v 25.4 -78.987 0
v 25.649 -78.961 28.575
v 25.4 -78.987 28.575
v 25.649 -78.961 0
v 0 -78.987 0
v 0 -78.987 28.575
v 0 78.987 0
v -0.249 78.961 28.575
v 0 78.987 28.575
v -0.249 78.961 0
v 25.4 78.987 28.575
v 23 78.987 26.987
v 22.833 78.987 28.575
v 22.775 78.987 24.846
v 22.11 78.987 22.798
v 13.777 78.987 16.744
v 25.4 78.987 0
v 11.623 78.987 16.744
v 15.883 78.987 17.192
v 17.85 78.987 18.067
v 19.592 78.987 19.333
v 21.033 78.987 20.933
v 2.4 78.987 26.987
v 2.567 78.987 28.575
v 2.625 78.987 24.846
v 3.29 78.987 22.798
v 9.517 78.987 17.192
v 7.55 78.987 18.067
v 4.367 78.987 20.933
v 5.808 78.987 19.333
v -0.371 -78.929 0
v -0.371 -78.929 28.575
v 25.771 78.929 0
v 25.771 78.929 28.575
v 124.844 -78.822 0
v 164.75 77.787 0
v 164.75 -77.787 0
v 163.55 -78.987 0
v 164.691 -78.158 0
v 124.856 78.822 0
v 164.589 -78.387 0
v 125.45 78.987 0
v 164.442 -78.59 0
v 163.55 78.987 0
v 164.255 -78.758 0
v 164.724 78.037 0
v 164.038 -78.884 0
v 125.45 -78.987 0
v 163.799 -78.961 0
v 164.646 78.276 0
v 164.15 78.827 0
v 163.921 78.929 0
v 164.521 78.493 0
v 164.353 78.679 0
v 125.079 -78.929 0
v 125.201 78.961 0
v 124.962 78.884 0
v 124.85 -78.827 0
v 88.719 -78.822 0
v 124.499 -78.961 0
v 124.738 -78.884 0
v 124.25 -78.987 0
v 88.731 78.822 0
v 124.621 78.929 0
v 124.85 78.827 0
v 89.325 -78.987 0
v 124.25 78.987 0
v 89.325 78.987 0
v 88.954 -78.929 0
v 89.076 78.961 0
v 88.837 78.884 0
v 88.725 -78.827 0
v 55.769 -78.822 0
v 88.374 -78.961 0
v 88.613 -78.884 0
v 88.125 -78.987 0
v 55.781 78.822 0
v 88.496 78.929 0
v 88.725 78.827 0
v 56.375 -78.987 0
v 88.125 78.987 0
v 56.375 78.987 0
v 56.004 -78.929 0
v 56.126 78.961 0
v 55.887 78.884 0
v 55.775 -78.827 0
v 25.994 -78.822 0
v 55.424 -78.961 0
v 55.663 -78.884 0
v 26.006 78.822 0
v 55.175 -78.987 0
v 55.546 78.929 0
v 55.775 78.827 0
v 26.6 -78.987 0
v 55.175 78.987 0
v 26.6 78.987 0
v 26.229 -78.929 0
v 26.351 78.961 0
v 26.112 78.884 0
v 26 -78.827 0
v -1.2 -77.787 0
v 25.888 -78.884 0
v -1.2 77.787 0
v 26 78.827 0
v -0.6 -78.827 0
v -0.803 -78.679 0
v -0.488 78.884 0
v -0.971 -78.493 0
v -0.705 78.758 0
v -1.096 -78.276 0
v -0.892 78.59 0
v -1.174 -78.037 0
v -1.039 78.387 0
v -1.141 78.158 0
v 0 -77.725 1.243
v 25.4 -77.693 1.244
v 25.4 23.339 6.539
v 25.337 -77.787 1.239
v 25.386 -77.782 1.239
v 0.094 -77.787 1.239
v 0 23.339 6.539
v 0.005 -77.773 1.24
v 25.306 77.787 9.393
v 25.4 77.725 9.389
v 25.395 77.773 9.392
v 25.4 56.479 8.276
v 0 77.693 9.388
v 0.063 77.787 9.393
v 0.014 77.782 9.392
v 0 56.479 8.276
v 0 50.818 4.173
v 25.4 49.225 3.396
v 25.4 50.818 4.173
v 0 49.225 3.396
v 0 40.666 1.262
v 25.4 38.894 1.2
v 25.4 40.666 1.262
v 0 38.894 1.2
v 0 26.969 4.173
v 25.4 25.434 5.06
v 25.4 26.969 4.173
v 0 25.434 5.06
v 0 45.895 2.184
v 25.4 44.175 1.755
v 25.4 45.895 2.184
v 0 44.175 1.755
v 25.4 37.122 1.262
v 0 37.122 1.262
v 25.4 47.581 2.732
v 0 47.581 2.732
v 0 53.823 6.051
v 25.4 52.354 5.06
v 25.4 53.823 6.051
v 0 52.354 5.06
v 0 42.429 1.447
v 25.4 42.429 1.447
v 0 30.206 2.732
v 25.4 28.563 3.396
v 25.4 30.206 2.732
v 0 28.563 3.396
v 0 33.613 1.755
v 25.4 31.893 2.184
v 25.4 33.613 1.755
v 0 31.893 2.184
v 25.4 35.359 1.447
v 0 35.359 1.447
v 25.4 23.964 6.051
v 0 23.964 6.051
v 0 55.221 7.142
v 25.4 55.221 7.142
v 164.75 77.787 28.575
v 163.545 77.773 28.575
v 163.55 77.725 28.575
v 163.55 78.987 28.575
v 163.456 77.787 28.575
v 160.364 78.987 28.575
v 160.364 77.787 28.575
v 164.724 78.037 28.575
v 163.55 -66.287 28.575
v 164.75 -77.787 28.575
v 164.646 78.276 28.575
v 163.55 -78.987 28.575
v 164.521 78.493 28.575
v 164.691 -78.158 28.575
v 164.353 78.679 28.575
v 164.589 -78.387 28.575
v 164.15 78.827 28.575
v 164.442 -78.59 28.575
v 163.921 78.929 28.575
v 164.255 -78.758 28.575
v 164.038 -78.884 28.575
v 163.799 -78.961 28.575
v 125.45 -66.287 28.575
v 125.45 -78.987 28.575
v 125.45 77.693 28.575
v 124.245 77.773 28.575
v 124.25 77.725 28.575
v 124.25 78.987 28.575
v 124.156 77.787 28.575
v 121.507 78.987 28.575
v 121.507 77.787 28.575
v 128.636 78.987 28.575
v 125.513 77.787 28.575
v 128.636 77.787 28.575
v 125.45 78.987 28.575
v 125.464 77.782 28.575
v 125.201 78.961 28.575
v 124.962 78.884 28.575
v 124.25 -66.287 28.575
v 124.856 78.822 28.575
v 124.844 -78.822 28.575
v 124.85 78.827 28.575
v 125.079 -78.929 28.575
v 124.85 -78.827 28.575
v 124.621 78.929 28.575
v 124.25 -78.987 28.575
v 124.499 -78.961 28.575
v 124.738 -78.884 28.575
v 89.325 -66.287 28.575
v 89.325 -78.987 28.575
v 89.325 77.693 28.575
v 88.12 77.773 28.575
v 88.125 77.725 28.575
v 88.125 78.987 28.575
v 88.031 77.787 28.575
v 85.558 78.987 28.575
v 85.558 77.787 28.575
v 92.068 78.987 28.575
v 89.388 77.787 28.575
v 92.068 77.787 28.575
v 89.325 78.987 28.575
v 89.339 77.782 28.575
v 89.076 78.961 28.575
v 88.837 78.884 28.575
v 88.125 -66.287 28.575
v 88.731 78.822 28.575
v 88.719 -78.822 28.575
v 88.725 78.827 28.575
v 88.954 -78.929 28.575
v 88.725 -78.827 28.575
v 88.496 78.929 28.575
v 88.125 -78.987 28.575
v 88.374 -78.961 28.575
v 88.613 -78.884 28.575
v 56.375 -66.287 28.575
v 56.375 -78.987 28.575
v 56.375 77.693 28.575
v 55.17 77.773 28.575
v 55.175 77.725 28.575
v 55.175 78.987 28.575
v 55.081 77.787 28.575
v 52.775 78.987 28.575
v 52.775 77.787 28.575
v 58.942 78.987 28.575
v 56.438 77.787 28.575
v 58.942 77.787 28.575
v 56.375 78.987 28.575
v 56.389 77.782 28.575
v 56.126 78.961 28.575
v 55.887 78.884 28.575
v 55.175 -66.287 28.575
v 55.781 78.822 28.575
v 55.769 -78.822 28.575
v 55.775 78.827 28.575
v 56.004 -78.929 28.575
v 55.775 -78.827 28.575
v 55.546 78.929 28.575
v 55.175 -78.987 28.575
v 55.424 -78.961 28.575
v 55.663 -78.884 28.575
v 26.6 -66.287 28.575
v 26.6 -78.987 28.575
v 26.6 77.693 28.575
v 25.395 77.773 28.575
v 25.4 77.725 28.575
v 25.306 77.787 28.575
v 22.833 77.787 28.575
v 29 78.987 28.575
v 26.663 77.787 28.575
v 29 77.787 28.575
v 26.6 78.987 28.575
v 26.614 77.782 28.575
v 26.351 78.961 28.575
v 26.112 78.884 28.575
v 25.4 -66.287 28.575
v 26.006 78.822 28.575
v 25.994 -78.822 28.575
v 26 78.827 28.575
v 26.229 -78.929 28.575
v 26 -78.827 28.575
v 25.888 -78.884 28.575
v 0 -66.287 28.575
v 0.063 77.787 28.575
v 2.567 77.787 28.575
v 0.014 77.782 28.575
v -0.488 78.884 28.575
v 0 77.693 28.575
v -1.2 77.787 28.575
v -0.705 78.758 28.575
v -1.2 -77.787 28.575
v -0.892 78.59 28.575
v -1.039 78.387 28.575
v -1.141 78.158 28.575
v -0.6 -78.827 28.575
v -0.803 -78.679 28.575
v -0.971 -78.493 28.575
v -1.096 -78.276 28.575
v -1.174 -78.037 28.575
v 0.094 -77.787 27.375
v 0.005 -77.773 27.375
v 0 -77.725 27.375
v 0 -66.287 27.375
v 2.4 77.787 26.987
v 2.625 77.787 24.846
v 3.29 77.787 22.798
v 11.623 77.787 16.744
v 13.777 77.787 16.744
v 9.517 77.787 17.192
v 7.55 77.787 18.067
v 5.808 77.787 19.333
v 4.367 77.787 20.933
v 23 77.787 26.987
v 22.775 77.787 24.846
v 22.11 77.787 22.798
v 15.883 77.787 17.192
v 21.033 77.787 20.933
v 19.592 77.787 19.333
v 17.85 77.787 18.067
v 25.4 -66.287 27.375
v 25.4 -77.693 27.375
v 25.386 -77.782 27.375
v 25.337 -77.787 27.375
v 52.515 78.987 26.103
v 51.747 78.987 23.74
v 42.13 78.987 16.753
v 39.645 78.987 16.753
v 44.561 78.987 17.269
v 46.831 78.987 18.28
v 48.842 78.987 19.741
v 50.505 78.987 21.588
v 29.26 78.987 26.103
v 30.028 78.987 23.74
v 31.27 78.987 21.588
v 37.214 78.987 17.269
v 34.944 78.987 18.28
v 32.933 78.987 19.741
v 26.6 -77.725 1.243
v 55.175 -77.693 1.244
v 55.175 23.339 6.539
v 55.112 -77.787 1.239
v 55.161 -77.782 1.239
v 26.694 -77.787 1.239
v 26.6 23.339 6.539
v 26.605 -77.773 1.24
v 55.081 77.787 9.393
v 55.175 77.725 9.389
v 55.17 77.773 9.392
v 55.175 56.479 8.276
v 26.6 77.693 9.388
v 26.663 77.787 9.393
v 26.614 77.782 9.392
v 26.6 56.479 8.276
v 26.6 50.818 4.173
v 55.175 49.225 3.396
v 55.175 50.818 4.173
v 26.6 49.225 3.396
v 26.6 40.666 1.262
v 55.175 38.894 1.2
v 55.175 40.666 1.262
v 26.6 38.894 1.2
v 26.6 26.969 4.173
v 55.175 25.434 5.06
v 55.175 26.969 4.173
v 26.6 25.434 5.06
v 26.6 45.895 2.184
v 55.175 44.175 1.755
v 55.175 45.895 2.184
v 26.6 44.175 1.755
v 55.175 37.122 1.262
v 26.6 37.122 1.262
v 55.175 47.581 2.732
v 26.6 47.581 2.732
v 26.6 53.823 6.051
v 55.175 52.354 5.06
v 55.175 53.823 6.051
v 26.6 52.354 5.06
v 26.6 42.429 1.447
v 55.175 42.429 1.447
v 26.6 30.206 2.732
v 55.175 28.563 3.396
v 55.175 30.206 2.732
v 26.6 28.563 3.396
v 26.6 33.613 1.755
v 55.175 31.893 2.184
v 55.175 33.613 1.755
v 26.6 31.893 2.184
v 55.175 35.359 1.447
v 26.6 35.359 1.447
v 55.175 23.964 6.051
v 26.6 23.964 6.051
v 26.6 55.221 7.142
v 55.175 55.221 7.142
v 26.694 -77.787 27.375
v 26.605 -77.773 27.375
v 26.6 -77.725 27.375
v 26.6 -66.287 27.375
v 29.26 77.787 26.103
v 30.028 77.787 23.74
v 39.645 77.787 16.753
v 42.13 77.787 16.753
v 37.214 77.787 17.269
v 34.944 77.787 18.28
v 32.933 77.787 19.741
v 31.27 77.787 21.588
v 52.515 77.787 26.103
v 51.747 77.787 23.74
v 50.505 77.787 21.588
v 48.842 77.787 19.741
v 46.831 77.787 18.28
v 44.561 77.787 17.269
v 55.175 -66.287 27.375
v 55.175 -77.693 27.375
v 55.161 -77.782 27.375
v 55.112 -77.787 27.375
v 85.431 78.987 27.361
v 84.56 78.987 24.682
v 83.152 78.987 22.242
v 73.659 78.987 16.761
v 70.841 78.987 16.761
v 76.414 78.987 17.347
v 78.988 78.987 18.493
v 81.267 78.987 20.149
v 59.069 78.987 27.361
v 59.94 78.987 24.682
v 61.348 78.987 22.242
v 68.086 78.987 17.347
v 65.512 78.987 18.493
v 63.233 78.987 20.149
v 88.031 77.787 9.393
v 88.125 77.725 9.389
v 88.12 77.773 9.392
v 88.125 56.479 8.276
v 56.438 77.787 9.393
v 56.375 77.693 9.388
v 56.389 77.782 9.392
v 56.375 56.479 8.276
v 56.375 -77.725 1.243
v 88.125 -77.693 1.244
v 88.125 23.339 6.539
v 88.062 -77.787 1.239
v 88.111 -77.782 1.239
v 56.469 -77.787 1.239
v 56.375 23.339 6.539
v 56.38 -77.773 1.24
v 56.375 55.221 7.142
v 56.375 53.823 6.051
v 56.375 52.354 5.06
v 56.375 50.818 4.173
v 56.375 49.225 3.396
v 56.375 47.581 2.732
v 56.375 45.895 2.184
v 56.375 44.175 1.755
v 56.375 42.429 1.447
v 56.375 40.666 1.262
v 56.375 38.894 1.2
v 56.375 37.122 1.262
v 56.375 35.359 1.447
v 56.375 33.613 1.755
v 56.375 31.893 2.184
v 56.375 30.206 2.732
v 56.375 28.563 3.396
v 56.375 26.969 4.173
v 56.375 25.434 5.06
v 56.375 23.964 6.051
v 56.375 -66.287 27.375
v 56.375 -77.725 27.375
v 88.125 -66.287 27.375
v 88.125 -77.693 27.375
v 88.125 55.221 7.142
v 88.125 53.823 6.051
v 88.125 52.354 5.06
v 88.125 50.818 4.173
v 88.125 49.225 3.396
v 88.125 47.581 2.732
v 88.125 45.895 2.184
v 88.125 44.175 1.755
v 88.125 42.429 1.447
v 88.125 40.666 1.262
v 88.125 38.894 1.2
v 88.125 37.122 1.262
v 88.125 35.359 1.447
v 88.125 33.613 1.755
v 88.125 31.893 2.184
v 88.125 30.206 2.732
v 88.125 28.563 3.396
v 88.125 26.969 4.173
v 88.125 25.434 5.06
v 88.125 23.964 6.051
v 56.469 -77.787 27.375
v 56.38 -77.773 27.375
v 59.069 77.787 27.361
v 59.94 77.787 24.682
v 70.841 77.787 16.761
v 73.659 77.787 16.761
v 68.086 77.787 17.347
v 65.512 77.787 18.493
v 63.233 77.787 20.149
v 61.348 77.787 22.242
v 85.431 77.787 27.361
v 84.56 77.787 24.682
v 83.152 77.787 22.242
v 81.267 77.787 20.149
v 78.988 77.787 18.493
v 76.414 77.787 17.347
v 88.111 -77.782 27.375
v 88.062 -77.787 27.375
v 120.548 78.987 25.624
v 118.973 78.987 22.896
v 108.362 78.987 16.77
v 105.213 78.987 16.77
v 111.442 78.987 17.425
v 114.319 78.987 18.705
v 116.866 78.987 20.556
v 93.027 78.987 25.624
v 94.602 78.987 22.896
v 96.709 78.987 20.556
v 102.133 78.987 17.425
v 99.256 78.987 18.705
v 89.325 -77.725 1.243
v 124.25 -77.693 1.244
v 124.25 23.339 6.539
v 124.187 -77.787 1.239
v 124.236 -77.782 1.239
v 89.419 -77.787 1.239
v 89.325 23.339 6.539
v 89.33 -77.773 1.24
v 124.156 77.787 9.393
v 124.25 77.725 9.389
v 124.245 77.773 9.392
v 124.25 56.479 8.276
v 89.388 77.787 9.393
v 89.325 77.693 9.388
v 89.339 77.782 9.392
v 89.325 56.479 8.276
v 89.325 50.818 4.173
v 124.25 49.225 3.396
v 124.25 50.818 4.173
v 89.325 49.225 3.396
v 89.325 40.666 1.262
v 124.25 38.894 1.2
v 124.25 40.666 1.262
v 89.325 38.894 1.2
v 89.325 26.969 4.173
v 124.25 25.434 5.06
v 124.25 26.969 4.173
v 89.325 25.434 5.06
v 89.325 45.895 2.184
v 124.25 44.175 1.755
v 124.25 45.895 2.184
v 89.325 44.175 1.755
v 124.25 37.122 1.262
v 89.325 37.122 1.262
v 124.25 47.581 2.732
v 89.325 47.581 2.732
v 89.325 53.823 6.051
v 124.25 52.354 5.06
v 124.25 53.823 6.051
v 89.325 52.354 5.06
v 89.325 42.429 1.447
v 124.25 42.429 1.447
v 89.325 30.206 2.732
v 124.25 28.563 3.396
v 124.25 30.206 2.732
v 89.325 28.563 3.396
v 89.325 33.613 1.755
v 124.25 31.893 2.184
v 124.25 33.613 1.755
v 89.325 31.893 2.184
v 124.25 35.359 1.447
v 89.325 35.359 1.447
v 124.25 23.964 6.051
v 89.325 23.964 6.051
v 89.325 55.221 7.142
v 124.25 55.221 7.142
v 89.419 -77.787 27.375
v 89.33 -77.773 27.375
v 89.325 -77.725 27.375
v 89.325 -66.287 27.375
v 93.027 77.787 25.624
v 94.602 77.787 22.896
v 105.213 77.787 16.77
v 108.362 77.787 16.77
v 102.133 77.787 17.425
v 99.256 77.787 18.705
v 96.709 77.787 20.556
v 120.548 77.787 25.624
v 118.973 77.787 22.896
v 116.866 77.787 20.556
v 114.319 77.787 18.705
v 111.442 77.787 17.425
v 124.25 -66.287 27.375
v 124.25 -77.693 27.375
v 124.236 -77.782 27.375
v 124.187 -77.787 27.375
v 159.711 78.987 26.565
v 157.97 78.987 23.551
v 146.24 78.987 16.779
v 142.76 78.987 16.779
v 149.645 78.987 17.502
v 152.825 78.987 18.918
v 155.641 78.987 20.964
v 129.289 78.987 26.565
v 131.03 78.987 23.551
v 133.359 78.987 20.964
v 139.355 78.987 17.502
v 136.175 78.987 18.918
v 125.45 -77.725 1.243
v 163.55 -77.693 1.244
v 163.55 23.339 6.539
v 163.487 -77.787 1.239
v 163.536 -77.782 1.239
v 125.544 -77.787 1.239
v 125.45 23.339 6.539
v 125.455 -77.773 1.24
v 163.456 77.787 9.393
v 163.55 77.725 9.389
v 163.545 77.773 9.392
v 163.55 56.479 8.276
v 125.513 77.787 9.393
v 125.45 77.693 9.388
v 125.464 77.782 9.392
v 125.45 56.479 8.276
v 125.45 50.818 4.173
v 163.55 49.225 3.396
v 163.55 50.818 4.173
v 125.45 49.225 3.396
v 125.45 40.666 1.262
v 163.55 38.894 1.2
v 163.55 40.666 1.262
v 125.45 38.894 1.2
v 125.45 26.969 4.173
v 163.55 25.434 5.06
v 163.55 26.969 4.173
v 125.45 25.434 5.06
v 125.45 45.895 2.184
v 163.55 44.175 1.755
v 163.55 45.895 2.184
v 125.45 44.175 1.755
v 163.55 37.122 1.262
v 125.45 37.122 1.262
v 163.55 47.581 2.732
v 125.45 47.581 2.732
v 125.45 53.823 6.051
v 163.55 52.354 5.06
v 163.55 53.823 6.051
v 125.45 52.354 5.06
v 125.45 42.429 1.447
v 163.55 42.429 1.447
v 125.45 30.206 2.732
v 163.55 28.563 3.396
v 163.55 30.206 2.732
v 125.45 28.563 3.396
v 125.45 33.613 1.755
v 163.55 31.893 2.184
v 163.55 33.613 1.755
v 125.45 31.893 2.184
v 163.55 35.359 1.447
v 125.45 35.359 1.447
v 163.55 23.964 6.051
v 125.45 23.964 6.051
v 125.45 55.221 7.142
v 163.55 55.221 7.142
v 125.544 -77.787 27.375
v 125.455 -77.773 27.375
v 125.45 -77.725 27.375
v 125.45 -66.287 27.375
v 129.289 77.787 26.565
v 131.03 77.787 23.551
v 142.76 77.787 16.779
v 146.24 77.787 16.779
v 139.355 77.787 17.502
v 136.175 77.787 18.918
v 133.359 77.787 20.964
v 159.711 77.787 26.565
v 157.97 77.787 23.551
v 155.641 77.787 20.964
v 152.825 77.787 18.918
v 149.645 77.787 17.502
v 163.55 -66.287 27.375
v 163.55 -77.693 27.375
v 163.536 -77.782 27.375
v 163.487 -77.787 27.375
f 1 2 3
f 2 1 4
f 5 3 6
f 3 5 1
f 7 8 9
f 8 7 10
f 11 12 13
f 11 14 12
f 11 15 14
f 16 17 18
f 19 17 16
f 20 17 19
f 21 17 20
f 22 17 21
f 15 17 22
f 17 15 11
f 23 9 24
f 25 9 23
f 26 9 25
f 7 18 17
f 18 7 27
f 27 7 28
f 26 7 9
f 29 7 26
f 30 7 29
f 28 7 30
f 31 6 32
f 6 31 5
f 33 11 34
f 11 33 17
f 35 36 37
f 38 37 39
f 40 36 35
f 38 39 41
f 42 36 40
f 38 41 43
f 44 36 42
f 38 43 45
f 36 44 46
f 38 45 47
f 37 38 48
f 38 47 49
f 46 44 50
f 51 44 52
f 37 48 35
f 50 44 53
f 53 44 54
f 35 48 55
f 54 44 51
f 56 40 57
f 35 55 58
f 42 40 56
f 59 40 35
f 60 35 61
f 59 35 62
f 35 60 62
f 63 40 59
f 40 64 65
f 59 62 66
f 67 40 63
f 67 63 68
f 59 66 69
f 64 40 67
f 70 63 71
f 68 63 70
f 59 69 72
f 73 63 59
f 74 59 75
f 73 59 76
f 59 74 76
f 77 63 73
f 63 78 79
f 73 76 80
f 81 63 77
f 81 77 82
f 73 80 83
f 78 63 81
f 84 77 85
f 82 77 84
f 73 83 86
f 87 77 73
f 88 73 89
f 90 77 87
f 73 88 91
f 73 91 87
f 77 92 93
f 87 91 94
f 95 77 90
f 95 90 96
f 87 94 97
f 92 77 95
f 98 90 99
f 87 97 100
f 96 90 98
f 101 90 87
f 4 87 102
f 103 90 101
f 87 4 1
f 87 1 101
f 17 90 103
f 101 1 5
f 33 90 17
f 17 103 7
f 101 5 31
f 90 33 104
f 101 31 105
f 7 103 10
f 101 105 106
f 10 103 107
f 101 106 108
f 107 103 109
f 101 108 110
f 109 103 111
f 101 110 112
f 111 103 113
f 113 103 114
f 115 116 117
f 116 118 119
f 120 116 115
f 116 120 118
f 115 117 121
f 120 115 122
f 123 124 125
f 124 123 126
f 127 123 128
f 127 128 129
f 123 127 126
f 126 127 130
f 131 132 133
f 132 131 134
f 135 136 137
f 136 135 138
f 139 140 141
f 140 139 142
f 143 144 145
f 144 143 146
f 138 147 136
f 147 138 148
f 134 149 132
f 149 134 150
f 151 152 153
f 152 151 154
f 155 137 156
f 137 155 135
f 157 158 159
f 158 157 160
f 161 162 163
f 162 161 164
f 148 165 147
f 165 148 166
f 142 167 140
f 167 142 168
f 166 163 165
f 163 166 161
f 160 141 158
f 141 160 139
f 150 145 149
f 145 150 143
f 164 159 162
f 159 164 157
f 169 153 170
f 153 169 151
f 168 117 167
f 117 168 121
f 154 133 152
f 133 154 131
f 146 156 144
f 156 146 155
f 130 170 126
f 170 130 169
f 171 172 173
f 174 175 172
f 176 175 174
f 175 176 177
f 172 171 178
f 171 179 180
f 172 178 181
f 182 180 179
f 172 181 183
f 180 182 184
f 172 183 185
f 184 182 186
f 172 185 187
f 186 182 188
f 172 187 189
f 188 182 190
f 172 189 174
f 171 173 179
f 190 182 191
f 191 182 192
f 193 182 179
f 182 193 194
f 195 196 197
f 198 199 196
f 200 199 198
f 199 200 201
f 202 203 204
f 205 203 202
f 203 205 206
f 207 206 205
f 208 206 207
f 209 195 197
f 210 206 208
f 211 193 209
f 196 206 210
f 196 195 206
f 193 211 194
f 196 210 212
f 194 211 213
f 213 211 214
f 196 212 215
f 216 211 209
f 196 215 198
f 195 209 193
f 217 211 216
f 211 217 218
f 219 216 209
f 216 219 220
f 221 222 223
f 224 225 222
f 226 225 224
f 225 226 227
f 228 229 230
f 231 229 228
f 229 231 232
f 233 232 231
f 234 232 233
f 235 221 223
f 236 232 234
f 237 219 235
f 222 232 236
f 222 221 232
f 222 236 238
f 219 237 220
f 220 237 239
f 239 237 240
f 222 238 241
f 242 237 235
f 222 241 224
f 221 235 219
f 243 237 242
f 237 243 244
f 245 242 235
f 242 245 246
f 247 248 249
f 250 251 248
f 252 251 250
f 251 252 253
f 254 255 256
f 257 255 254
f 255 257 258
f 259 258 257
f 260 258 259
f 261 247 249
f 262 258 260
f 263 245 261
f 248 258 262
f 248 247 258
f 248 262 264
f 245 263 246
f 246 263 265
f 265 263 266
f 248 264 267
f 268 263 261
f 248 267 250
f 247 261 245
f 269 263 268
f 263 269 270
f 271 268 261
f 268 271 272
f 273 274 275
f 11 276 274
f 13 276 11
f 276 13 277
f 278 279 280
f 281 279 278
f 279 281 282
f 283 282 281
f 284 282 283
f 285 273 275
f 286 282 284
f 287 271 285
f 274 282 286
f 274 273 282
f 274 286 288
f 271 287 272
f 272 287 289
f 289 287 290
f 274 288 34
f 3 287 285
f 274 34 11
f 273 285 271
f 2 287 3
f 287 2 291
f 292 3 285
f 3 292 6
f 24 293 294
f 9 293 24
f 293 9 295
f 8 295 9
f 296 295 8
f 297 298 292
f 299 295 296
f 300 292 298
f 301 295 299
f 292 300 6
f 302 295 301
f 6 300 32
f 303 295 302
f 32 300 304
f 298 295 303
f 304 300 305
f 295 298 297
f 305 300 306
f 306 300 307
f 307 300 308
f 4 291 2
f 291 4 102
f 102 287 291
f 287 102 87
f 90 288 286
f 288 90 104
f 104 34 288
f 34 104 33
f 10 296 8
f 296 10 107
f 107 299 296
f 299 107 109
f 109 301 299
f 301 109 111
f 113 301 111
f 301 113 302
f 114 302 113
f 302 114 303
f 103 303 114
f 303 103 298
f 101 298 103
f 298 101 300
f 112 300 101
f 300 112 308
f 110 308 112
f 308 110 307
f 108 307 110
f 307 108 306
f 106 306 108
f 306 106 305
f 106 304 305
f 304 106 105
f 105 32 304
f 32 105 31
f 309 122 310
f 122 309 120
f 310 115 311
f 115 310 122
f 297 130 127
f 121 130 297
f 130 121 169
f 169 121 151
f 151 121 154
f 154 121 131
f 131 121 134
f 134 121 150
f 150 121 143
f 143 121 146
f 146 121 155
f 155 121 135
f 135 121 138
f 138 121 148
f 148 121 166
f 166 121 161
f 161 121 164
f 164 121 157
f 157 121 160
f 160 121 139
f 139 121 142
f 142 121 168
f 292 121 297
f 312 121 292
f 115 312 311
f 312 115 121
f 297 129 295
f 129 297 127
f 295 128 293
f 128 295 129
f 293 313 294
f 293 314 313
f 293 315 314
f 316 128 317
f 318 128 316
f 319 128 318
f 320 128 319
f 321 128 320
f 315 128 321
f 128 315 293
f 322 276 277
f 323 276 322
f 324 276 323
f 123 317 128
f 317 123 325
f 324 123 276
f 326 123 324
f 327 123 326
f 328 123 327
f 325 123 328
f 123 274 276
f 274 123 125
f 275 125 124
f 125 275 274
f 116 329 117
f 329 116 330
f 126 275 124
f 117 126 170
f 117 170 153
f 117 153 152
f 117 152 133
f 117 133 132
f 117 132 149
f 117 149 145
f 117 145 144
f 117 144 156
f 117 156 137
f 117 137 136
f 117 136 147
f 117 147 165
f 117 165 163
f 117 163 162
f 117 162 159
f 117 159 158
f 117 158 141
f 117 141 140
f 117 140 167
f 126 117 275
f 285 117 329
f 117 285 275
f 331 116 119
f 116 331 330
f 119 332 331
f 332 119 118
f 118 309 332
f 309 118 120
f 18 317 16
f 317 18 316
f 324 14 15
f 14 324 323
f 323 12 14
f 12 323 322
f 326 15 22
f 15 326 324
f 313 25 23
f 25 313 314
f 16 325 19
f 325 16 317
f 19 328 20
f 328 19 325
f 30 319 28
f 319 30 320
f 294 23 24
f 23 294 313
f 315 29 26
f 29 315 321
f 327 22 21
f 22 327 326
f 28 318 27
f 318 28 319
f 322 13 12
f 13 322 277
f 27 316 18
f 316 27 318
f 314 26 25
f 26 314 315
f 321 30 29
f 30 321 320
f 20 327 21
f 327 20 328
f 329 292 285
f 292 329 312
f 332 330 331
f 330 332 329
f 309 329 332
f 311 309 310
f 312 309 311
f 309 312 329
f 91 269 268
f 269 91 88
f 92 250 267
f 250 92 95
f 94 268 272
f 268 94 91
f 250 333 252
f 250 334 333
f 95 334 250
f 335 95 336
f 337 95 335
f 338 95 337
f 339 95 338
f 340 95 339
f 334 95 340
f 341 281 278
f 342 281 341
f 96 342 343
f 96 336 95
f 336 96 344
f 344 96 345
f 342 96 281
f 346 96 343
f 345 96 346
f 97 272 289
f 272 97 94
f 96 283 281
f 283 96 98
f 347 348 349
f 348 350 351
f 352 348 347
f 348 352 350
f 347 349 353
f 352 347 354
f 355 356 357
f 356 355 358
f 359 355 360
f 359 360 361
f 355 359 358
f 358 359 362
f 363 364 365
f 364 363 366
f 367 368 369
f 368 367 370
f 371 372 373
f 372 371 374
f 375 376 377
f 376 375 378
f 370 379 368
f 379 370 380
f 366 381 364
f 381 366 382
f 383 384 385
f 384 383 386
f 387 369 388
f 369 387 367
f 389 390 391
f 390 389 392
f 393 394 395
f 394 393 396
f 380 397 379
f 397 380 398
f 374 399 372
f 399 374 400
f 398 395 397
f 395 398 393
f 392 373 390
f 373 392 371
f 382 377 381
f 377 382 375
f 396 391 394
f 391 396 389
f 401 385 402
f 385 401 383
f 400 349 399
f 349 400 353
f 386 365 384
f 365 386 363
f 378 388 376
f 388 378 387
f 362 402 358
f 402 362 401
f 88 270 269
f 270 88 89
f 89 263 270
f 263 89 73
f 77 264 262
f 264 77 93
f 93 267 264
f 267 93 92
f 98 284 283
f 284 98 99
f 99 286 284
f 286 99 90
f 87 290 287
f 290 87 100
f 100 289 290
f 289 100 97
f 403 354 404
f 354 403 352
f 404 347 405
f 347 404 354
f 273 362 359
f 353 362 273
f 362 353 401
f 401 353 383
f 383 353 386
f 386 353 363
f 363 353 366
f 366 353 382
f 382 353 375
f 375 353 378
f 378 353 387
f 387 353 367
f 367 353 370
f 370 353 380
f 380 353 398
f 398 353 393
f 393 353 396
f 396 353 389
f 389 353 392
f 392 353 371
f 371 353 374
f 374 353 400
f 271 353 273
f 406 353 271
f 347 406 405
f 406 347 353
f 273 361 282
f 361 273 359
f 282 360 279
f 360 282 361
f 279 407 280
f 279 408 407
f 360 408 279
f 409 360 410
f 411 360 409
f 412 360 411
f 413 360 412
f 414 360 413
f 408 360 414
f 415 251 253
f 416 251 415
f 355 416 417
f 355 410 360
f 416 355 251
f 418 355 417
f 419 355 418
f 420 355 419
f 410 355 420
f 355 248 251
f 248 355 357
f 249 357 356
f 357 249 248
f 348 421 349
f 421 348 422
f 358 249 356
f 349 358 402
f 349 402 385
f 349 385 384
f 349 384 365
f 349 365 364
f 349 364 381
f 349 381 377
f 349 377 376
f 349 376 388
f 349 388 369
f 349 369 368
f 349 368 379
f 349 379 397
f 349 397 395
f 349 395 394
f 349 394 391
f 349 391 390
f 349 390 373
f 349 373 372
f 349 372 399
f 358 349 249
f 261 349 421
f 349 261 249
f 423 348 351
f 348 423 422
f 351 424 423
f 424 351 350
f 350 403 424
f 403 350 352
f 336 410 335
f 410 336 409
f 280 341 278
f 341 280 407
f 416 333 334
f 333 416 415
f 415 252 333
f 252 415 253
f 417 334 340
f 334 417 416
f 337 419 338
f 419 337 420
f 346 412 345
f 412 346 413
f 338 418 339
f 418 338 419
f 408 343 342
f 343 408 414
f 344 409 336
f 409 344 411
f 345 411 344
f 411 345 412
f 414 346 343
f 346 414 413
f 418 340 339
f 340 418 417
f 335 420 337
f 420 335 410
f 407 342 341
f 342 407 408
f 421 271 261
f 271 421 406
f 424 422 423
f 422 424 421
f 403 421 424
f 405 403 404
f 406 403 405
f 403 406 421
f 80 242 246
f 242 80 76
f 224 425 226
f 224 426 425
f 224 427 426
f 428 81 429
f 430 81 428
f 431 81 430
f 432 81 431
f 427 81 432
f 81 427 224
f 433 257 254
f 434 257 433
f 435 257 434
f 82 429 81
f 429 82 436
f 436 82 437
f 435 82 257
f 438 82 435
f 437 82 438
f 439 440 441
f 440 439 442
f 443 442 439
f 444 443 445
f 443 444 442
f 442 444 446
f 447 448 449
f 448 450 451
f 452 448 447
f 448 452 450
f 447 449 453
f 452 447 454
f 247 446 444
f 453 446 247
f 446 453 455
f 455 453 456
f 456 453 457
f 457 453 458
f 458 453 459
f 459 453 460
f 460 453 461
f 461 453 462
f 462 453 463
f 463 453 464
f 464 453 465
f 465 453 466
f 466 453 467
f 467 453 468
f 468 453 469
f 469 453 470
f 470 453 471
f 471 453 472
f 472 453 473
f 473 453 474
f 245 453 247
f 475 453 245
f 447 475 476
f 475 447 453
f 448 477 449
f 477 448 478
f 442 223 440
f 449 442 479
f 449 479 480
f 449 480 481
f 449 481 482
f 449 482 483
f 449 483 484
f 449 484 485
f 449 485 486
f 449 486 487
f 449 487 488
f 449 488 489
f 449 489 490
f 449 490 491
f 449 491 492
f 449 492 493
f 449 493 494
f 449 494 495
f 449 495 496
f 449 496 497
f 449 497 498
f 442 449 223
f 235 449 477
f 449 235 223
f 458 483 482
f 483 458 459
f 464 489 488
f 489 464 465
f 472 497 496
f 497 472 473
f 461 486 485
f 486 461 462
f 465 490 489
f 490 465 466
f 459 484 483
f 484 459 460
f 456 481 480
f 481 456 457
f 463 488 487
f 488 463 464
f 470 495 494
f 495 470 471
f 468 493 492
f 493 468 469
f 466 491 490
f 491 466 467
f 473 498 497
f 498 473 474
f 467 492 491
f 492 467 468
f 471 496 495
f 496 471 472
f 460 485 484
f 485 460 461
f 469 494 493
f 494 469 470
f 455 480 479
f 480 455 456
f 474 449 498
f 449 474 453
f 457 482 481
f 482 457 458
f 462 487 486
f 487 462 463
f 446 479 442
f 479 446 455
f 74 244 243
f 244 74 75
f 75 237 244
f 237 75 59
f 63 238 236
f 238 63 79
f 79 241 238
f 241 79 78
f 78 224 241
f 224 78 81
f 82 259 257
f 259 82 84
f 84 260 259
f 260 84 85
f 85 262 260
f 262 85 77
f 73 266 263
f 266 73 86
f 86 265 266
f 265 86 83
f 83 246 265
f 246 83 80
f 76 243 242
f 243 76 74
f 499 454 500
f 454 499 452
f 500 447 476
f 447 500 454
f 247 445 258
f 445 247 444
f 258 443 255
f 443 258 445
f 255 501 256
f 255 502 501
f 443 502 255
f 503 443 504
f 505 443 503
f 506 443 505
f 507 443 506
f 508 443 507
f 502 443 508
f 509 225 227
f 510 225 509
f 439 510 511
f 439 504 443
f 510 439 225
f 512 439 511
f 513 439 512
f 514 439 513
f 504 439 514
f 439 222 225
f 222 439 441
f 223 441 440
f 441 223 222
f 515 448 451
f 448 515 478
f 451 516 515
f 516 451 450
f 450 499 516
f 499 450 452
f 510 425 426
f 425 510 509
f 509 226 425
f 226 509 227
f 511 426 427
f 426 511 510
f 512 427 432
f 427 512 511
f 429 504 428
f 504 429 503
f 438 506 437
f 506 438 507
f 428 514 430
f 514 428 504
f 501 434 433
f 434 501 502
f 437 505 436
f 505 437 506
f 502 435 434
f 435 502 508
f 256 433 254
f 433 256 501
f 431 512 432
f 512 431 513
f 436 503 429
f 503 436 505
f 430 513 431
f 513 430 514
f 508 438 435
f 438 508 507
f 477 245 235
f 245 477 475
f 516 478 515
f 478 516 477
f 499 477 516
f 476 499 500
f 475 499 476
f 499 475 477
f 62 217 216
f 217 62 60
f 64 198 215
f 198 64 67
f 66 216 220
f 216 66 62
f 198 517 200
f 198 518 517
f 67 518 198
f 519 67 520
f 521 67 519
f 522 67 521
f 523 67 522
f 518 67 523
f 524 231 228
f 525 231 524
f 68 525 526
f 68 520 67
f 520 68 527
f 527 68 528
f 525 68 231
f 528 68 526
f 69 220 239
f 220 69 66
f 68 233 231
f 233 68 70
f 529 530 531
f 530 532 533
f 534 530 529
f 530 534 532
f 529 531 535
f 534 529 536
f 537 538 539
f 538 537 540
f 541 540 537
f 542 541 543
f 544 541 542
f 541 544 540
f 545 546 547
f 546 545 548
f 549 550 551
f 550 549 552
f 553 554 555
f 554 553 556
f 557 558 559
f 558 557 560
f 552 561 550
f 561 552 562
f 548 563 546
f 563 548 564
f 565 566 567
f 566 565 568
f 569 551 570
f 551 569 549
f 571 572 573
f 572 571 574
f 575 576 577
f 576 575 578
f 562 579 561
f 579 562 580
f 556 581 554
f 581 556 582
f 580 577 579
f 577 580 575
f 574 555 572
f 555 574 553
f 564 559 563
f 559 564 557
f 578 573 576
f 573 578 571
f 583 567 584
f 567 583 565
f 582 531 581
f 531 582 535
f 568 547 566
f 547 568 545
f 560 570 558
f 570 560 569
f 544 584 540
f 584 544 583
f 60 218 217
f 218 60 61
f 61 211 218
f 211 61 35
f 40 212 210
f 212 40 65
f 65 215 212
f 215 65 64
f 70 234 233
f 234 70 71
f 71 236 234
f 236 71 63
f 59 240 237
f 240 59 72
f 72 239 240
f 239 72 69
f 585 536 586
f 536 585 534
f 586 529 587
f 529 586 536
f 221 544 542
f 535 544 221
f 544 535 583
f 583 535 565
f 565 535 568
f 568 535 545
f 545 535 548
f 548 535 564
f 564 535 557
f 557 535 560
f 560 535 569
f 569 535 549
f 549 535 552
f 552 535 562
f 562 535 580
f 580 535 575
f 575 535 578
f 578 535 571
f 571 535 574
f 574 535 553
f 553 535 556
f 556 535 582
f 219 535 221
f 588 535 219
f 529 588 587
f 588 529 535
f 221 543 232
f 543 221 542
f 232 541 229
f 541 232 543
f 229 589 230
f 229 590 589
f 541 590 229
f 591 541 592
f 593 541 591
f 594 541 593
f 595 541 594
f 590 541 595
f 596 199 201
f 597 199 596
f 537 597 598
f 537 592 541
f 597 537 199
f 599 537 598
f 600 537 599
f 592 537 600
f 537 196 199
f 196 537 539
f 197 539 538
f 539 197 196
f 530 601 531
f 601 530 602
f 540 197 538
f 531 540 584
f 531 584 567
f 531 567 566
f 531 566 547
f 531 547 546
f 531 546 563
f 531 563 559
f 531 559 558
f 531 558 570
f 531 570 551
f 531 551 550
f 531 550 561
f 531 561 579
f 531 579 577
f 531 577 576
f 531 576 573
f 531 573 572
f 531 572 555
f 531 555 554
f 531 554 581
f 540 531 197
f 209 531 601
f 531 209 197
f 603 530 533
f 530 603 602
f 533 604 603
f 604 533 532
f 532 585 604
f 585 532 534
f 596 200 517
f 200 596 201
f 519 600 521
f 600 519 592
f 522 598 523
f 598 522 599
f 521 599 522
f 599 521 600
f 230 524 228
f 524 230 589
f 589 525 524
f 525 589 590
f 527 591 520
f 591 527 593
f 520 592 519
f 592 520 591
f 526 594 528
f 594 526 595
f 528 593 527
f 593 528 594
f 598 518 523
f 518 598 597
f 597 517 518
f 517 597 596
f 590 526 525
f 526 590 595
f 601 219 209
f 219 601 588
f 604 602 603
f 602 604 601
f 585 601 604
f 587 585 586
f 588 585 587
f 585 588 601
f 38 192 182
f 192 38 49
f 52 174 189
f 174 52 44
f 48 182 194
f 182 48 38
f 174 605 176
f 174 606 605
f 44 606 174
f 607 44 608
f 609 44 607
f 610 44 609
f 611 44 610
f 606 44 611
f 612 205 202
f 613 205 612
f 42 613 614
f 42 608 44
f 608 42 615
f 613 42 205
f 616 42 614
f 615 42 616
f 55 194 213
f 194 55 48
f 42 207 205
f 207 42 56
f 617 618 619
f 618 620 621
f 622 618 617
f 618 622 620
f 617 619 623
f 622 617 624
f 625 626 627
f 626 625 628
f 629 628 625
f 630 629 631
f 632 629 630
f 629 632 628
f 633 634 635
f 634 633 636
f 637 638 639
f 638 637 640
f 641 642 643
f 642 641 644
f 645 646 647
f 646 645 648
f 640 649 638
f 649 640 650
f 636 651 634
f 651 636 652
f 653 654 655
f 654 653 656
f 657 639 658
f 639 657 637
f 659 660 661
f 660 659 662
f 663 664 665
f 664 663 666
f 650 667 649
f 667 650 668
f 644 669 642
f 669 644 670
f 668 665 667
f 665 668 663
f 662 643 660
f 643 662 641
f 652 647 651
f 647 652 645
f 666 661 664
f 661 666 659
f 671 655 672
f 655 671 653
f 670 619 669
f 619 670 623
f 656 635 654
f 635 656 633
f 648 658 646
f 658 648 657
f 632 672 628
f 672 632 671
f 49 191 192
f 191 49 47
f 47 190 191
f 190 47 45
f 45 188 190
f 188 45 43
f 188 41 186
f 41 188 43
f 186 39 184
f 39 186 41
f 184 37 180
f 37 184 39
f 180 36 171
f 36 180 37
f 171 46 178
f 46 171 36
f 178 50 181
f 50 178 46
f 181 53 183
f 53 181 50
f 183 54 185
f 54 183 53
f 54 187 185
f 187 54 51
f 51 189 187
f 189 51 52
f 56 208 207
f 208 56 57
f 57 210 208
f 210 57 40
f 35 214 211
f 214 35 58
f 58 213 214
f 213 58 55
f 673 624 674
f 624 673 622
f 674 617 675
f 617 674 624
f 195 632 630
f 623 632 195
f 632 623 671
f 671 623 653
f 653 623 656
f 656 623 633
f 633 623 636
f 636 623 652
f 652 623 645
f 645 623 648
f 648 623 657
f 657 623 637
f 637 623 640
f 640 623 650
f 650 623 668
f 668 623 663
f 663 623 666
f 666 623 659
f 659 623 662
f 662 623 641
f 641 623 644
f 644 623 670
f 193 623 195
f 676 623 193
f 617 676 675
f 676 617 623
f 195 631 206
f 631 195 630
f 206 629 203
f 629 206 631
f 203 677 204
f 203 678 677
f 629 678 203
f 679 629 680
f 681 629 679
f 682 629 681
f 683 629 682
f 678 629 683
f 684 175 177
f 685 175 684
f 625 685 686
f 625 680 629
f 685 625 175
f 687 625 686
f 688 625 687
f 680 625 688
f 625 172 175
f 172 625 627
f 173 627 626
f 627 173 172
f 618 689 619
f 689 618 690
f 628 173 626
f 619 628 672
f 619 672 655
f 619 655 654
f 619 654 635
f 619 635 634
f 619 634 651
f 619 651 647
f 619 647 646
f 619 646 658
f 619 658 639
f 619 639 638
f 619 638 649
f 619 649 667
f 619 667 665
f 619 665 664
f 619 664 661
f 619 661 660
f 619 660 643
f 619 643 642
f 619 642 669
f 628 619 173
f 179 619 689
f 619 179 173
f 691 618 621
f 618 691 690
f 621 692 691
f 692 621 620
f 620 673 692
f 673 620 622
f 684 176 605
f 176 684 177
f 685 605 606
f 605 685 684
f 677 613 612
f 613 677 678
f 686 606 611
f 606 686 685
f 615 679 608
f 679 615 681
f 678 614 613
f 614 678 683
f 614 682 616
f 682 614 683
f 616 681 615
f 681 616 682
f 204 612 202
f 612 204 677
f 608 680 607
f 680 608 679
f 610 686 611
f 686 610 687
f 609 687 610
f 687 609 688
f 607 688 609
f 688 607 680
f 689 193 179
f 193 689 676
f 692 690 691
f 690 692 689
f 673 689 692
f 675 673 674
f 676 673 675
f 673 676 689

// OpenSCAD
// Heat Shrink Organizer Tray
// Adrian McCarthy

function inch(x) = x * 25.4;
function slice(list, range) = [for (i = range) list[i]];
function sum(values) =
    len(values) == 0 ? 0 :
    len(values) == 1 ? values[0] :
                       values[0] +
                         sum([for (i=[1:len(values)-1]) values[i]]);

module tray(length=inch(6+1/8), widths=[for (i=[0:4]) inch(1)], height=inch(3/4), nozzle_d=0.4) {
    $fs = nozzle_d/2;

    depression_d = inch(2);
    th = 1.2;

    module footprint(width) {
        offset(r=th) square([width, length], center=true);
    }

    module bottom(width) {
        difference() {
            intersection() {
                linear_extrude(height, convexity=6) footprint(width);
                translate([0, 0, th-height]) {
                    translate([0, -length/2, 0]) {
                        rotate([3, 0, 0]) {
                            translate([0, length/2, 0]) {
                                linear_extrude(height) {
                                    square([width, 2*length], center=true);
                                }
                            }
                        }
                    }
                }
            }
            translate([0, length/4, depression_d/2+th])
                rotate([0, 90, 0])
                    cylinder(h=width, d=depression_d, center=true, $fa=4);
        }
    }

    module walls(width) {
        difference() {
            linear_extrude(height, convexity=6) {
                difference() {
                    footprint(width);
                    offset(r=-th) footprint(width);
                }
            }
            translate([0, 0, (width+height)/2])
                rotate([-90, 0, 0])
                    cylinder(h=length, d=width-4*th);
        }
    }
    
    module rail(width) {
        rail_size = inch(1/2);
        translate([0, 0, height-th]) {
            linear_extrude(th, convexity=6) {
                intersection() {
                    footprint(width);
                    translate([0, rail_size/2 - length/2 - th]) {
                        square([th + width + th, rail_size], center=true);
                    }
                }
            }
        }
    }
    
    module unit(width) {
        bottom(width);
        walls(width);
        rail(width);
    }

    offsets = [
        for (i = [0:len(widths)-1])
            i*th + sum(slice(widths, [0:i])) - widths[i]/2
    ];
    echo(widths);
    echo(offsets);

    for (i = [0:len(widths)-1]) {
        translate([offsets[i], 0, 0]) unit(widths[i]);
    }
}

tray(widths=[inch(1), inch(1+1/8), inch(1+1/4), inch(1+3/8), inch(1+1/2)], height=inch(1+1/8));
